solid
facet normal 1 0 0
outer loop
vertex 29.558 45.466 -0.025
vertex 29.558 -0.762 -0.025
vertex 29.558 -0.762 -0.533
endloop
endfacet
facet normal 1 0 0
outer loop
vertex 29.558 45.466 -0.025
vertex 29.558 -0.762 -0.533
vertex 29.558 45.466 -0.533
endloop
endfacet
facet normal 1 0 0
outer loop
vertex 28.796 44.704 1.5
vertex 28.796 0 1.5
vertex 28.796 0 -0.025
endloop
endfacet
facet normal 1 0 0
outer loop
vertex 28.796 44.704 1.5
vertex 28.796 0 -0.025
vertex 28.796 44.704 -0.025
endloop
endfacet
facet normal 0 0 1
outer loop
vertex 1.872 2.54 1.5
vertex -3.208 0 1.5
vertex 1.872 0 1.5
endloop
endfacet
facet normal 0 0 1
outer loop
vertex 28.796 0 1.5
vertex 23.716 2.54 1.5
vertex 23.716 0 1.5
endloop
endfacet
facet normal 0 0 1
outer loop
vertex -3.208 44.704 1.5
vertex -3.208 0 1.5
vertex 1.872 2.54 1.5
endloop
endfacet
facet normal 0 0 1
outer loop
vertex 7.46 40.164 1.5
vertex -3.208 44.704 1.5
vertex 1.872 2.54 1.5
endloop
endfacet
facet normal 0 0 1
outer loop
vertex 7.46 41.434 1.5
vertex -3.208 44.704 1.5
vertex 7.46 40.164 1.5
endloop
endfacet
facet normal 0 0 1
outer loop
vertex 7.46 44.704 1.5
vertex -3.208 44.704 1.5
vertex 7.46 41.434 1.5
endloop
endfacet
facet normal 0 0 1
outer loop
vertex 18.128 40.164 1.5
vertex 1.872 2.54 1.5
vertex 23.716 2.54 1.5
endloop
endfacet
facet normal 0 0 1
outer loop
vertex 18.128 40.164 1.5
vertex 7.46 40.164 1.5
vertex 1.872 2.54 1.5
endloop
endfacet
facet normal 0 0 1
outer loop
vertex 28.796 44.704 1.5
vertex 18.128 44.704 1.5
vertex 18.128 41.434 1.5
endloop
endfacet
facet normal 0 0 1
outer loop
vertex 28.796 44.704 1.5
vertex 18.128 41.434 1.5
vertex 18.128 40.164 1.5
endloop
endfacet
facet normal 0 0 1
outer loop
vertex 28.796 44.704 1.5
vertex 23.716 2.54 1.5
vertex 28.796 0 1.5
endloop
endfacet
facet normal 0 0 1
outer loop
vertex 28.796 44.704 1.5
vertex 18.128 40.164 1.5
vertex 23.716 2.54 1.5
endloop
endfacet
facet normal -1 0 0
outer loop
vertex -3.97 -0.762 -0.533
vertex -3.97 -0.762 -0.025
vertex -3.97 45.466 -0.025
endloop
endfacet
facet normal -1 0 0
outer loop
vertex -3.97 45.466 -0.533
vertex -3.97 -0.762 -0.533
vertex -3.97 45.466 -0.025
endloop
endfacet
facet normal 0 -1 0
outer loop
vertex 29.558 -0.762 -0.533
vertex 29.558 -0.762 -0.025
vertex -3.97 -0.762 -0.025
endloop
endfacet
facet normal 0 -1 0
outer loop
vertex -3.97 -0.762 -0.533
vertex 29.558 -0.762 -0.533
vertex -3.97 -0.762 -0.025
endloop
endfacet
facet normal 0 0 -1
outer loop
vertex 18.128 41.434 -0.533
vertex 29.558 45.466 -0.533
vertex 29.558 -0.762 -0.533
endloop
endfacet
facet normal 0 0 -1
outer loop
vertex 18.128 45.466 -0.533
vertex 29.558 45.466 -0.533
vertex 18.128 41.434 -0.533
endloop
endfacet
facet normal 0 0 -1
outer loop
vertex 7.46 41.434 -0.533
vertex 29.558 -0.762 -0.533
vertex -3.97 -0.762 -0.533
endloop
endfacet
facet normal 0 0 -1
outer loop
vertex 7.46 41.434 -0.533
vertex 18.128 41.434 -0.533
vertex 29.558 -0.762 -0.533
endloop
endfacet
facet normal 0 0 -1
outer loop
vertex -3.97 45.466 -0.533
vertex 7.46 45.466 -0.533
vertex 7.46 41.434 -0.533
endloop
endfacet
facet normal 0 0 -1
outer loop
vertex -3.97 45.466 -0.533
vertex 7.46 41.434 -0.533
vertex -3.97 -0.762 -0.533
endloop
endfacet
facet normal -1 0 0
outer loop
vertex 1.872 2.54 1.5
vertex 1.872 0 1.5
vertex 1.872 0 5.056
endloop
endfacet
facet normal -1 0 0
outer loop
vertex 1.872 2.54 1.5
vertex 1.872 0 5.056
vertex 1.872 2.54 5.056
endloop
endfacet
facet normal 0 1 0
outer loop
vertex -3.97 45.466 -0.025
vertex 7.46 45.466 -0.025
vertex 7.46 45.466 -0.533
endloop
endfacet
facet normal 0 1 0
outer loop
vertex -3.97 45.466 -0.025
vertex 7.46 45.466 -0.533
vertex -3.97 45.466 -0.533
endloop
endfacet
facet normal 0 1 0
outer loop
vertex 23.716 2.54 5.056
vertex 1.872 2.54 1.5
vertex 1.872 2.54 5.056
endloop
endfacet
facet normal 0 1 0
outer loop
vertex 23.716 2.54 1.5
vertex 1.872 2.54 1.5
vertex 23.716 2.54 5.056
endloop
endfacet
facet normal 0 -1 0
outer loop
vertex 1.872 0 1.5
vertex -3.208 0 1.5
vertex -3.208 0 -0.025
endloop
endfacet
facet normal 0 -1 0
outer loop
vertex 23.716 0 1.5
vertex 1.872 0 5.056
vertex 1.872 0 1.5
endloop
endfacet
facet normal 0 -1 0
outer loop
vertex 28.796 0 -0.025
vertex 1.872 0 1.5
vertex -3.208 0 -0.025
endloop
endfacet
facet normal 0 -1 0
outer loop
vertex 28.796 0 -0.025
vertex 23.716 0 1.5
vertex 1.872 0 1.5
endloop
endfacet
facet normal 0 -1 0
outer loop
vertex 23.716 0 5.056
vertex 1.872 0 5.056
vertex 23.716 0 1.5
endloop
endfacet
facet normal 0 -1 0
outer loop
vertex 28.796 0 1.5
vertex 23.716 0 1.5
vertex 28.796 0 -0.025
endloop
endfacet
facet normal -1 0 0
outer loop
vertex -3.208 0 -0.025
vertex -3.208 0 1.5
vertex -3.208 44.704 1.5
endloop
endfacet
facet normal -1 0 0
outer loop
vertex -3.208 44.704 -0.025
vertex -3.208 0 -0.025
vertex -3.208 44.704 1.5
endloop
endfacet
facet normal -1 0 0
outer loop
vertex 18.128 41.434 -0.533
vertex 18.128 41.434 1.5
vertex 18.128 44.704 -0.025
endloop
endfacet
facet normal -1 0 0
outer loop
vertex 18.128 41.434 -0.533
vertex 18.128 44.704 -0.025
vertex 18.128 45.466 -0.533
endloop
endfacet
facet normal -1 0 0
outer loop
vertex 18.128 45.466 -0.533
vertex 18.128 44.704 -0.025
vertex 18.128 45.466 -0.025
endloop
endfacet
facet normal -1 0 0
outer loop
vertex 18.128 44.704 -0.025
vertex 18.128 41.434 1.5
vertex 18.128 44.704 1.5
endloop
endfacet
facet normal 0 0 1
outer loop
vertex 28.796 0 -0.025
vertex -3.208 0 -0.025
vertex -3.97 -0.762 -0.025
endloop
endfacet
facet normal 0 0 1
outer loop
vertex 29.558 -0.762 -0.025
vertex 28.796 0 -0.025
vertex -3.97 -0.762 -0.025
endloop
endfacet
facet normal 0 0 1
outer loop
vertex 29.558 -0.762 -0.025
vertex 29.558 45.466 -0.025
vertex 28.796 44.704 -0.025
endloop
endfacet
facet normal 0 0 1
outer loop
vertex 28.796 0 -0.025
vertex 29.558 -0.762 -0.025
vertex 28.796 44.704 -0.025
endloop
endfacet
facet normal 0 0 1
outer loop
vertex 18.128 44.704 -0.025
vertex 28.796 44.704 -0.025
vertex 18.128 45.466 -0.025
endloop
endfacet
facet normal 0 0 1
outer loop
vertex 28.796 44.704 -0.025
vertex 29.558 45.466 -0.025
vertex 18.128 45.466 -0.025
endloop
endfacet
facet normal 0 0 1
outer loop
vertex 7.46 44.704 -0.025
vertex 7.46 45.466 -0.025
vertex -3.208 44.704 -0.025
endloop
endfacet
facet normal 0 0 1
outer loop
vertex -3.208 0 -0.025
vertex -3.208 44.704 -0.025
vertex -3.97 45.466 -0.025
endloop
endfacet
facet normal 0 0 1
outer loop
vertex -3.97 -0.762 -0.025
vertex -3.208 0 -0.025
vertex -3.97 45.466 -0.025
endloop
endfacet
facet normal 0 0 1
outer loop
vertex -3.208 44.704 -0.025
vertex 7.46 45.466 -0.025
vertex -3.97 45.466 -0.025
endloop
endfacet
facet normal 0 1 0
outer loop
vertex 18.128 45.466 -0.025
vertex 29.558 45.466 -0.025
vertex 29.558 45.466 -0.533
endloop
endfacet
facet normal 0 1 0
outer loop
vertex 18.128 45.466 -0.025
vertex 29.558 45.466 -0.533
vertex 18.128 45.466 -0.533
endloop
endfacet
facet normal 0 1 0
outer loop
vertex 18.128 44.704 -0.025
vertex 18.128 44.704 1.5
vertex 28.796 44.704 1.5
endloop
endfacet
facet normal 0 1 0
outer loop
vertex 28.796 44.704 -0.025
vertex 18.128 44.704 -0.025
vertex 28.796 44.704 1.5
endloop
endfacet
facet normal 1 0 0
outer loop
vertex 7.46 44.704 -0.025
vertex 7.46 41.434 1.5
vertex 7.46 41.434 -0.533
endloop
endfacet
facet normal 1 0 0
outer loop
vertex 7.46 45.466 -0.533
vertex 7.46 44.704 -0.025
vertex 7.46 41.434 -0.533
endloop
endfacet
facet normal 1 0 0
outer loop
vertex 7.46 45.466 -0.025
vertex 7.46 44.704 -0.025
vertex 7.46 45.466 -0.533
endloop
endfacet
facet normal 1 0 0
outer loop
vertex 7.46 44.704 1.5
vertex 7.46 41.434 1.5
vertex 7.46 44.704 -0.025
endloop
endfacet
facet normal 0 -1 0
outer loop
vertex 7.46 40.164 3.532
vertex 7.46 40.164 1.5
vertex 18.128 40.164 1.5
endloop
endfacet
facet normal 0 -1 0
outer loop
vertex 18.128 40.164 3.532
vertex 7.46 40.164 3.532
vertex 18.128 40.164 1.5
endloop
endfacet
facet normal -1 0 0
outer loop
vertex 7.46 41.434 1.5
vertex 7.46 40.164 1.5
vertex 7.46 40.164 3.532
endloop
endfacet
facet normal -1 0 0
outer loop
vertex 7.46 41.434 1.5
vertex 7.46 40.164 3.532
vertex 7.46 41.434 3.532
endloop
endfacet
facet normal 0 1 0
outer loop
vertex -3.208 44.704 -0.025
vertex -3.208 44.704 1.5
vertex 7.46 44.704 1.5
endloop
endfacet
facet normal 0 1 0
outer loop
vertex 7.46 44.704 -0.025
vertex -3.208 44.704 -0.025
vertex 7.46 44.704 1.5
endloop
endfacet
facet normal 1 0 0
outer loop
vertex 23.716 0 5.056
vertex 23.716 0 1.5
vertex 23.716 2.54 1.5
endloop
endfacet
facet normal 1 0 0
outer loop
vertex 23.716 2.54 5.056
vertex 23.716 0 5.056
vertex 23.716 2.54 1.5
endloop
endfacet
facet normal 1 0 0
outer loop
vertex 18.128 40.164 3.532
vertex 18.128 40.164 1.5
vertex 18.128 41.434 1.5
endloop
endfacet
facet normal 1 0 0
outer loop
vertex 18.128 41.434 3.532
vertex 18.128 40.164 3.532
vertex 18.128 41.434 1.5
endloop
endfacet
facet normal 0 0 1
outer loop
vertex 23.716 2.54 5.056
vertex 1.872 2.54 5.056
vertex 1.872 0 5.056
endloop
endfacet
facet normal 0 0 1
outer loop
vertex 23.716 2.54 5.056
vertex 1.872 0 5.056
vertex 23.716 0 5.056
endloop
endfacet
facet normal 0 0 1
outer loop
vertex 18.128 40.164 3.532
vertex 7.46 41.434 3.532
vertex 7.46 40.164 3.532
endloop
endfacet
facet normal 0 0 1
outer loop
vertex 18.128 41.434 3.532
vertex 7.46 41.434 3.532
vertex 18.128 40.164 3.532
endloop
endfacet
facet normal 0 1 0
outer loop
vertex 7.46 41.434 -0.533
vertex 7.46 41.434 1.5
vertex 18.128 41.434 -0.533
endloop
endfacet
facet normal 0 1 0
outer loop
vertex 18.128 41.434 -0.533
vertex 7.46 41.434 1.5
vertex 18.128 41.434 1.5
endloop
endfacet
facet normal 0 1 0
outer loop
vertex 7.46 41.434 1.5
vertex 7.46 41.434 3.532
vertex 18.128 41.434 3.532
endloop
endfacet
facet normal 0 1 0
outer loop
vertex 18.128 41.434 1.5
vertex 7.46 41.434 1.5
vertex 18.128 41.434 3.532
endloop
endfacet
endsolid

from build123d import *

# Parameters (mm, degrees)
SKETCH1_W                = 32.004
SKETCH1_H                = 44.704
BOSS_EXTRUDE1_DEPTH      = 1.5
BOSS_EXTRUDE1_DEPTH_BACK = 0.0254
SKETCH2_W                = 10.668
SKETCH2_H                = 2.54
BOSS_EXTRUDE2_DEPTH      = 2.032
SKETCH4_W                = 10.668
SKETCH4_H                = 1.746
CUT_EXTRUDE1_DEPTH       = 3.81
SKETCH5_W                = 21.844
SKETCH5_H                = 2.54
BOSS_EXTRUDE3_DEPTH      = 3.556
SKETCH10_W               = 33.528
SKETCH10_H               = 46.228
BOSS_EXTRUDE5_DEPTH      = 0.508
SKETCH13_W               = 10.668
SKETCH13_H               = 5.08
CUT_EXTRUDE2_DEPTH       = 8.128


with BuildPart() as part:
    # Sketch1 → Boss-Extrude1 (new body, two sides)
    with BuildSketch(Plane.XY) as boss_extrude1_sk:
        with Locations((12.794077502, 22.352)):
            Rectangle(SKETCH1_W, SKETCH1_H)
    extrude(amount=BOSS_EXTRUDE1_DEPTH)
    extrude(boss_extrude1_sk.sketch, amount=-BOSS_EXTRUDE1_DEPTH_BACK)

    # Sketch2 → Boss-Extrude2 (add)
    with BuildSketch(Plane.XY.offset(1.5)):
        with Locations((12.794077502, 41.434)):
            Rectangle(SKETCH2_W, SKETCH2_H)
    extrude(amount=BOSS_EXTRUDE2_DEPTH)

    # Sketch4 → Cut-Extrude1 (cut)
    with BuildSketch(Plane.XY.offset(1.5)):
        with Locations((12.794077502, 43.831)):
            Rectangle(SKETCH4_W, SKETCH4_H)
    extrude(amount=-CUT_EXTRUDE1_DEPTH, mode=Mode.SUBTRACT)

    # Sketch5 → Boss-Extrude3 (add)
    with BuildSketch(Plane.XY.offset(1.5)):
        with Locations((12.794077502, 1.27)):
            Rectangle(SKETCH5_W, SKETCH5_H)
    extrude(amount=BOSS_EXTRUDE3_DEPTH)

    # Sketch10 → Boss-Extrude5 (add)
    with BuildSketch(Plane(origin=(0, 0, -0.0254), x_dir=(-1, 0, 0), z_dir=(0, 0, -1))):
        with Locations((-12.794077502, 22.352)):
            Rectangle(SKETCH10_W, SKETCH10_H)
    extrude(amount=BOSS_EXTRUDE5_DEPTH)

    # Sketch13 → Cut-Extrude2 (cut)
    with BuildSketch(Plane.XY.offset(3.532)):
        with Locations((12.794077502, 43.974)):
            Rectangle(SKETCH13_W, SKETCH13_H)
    extrude(amount=-CUT_EXTRUDE2_DEPTH, mode=Mode.SUBTRACT)


solid = part.part
